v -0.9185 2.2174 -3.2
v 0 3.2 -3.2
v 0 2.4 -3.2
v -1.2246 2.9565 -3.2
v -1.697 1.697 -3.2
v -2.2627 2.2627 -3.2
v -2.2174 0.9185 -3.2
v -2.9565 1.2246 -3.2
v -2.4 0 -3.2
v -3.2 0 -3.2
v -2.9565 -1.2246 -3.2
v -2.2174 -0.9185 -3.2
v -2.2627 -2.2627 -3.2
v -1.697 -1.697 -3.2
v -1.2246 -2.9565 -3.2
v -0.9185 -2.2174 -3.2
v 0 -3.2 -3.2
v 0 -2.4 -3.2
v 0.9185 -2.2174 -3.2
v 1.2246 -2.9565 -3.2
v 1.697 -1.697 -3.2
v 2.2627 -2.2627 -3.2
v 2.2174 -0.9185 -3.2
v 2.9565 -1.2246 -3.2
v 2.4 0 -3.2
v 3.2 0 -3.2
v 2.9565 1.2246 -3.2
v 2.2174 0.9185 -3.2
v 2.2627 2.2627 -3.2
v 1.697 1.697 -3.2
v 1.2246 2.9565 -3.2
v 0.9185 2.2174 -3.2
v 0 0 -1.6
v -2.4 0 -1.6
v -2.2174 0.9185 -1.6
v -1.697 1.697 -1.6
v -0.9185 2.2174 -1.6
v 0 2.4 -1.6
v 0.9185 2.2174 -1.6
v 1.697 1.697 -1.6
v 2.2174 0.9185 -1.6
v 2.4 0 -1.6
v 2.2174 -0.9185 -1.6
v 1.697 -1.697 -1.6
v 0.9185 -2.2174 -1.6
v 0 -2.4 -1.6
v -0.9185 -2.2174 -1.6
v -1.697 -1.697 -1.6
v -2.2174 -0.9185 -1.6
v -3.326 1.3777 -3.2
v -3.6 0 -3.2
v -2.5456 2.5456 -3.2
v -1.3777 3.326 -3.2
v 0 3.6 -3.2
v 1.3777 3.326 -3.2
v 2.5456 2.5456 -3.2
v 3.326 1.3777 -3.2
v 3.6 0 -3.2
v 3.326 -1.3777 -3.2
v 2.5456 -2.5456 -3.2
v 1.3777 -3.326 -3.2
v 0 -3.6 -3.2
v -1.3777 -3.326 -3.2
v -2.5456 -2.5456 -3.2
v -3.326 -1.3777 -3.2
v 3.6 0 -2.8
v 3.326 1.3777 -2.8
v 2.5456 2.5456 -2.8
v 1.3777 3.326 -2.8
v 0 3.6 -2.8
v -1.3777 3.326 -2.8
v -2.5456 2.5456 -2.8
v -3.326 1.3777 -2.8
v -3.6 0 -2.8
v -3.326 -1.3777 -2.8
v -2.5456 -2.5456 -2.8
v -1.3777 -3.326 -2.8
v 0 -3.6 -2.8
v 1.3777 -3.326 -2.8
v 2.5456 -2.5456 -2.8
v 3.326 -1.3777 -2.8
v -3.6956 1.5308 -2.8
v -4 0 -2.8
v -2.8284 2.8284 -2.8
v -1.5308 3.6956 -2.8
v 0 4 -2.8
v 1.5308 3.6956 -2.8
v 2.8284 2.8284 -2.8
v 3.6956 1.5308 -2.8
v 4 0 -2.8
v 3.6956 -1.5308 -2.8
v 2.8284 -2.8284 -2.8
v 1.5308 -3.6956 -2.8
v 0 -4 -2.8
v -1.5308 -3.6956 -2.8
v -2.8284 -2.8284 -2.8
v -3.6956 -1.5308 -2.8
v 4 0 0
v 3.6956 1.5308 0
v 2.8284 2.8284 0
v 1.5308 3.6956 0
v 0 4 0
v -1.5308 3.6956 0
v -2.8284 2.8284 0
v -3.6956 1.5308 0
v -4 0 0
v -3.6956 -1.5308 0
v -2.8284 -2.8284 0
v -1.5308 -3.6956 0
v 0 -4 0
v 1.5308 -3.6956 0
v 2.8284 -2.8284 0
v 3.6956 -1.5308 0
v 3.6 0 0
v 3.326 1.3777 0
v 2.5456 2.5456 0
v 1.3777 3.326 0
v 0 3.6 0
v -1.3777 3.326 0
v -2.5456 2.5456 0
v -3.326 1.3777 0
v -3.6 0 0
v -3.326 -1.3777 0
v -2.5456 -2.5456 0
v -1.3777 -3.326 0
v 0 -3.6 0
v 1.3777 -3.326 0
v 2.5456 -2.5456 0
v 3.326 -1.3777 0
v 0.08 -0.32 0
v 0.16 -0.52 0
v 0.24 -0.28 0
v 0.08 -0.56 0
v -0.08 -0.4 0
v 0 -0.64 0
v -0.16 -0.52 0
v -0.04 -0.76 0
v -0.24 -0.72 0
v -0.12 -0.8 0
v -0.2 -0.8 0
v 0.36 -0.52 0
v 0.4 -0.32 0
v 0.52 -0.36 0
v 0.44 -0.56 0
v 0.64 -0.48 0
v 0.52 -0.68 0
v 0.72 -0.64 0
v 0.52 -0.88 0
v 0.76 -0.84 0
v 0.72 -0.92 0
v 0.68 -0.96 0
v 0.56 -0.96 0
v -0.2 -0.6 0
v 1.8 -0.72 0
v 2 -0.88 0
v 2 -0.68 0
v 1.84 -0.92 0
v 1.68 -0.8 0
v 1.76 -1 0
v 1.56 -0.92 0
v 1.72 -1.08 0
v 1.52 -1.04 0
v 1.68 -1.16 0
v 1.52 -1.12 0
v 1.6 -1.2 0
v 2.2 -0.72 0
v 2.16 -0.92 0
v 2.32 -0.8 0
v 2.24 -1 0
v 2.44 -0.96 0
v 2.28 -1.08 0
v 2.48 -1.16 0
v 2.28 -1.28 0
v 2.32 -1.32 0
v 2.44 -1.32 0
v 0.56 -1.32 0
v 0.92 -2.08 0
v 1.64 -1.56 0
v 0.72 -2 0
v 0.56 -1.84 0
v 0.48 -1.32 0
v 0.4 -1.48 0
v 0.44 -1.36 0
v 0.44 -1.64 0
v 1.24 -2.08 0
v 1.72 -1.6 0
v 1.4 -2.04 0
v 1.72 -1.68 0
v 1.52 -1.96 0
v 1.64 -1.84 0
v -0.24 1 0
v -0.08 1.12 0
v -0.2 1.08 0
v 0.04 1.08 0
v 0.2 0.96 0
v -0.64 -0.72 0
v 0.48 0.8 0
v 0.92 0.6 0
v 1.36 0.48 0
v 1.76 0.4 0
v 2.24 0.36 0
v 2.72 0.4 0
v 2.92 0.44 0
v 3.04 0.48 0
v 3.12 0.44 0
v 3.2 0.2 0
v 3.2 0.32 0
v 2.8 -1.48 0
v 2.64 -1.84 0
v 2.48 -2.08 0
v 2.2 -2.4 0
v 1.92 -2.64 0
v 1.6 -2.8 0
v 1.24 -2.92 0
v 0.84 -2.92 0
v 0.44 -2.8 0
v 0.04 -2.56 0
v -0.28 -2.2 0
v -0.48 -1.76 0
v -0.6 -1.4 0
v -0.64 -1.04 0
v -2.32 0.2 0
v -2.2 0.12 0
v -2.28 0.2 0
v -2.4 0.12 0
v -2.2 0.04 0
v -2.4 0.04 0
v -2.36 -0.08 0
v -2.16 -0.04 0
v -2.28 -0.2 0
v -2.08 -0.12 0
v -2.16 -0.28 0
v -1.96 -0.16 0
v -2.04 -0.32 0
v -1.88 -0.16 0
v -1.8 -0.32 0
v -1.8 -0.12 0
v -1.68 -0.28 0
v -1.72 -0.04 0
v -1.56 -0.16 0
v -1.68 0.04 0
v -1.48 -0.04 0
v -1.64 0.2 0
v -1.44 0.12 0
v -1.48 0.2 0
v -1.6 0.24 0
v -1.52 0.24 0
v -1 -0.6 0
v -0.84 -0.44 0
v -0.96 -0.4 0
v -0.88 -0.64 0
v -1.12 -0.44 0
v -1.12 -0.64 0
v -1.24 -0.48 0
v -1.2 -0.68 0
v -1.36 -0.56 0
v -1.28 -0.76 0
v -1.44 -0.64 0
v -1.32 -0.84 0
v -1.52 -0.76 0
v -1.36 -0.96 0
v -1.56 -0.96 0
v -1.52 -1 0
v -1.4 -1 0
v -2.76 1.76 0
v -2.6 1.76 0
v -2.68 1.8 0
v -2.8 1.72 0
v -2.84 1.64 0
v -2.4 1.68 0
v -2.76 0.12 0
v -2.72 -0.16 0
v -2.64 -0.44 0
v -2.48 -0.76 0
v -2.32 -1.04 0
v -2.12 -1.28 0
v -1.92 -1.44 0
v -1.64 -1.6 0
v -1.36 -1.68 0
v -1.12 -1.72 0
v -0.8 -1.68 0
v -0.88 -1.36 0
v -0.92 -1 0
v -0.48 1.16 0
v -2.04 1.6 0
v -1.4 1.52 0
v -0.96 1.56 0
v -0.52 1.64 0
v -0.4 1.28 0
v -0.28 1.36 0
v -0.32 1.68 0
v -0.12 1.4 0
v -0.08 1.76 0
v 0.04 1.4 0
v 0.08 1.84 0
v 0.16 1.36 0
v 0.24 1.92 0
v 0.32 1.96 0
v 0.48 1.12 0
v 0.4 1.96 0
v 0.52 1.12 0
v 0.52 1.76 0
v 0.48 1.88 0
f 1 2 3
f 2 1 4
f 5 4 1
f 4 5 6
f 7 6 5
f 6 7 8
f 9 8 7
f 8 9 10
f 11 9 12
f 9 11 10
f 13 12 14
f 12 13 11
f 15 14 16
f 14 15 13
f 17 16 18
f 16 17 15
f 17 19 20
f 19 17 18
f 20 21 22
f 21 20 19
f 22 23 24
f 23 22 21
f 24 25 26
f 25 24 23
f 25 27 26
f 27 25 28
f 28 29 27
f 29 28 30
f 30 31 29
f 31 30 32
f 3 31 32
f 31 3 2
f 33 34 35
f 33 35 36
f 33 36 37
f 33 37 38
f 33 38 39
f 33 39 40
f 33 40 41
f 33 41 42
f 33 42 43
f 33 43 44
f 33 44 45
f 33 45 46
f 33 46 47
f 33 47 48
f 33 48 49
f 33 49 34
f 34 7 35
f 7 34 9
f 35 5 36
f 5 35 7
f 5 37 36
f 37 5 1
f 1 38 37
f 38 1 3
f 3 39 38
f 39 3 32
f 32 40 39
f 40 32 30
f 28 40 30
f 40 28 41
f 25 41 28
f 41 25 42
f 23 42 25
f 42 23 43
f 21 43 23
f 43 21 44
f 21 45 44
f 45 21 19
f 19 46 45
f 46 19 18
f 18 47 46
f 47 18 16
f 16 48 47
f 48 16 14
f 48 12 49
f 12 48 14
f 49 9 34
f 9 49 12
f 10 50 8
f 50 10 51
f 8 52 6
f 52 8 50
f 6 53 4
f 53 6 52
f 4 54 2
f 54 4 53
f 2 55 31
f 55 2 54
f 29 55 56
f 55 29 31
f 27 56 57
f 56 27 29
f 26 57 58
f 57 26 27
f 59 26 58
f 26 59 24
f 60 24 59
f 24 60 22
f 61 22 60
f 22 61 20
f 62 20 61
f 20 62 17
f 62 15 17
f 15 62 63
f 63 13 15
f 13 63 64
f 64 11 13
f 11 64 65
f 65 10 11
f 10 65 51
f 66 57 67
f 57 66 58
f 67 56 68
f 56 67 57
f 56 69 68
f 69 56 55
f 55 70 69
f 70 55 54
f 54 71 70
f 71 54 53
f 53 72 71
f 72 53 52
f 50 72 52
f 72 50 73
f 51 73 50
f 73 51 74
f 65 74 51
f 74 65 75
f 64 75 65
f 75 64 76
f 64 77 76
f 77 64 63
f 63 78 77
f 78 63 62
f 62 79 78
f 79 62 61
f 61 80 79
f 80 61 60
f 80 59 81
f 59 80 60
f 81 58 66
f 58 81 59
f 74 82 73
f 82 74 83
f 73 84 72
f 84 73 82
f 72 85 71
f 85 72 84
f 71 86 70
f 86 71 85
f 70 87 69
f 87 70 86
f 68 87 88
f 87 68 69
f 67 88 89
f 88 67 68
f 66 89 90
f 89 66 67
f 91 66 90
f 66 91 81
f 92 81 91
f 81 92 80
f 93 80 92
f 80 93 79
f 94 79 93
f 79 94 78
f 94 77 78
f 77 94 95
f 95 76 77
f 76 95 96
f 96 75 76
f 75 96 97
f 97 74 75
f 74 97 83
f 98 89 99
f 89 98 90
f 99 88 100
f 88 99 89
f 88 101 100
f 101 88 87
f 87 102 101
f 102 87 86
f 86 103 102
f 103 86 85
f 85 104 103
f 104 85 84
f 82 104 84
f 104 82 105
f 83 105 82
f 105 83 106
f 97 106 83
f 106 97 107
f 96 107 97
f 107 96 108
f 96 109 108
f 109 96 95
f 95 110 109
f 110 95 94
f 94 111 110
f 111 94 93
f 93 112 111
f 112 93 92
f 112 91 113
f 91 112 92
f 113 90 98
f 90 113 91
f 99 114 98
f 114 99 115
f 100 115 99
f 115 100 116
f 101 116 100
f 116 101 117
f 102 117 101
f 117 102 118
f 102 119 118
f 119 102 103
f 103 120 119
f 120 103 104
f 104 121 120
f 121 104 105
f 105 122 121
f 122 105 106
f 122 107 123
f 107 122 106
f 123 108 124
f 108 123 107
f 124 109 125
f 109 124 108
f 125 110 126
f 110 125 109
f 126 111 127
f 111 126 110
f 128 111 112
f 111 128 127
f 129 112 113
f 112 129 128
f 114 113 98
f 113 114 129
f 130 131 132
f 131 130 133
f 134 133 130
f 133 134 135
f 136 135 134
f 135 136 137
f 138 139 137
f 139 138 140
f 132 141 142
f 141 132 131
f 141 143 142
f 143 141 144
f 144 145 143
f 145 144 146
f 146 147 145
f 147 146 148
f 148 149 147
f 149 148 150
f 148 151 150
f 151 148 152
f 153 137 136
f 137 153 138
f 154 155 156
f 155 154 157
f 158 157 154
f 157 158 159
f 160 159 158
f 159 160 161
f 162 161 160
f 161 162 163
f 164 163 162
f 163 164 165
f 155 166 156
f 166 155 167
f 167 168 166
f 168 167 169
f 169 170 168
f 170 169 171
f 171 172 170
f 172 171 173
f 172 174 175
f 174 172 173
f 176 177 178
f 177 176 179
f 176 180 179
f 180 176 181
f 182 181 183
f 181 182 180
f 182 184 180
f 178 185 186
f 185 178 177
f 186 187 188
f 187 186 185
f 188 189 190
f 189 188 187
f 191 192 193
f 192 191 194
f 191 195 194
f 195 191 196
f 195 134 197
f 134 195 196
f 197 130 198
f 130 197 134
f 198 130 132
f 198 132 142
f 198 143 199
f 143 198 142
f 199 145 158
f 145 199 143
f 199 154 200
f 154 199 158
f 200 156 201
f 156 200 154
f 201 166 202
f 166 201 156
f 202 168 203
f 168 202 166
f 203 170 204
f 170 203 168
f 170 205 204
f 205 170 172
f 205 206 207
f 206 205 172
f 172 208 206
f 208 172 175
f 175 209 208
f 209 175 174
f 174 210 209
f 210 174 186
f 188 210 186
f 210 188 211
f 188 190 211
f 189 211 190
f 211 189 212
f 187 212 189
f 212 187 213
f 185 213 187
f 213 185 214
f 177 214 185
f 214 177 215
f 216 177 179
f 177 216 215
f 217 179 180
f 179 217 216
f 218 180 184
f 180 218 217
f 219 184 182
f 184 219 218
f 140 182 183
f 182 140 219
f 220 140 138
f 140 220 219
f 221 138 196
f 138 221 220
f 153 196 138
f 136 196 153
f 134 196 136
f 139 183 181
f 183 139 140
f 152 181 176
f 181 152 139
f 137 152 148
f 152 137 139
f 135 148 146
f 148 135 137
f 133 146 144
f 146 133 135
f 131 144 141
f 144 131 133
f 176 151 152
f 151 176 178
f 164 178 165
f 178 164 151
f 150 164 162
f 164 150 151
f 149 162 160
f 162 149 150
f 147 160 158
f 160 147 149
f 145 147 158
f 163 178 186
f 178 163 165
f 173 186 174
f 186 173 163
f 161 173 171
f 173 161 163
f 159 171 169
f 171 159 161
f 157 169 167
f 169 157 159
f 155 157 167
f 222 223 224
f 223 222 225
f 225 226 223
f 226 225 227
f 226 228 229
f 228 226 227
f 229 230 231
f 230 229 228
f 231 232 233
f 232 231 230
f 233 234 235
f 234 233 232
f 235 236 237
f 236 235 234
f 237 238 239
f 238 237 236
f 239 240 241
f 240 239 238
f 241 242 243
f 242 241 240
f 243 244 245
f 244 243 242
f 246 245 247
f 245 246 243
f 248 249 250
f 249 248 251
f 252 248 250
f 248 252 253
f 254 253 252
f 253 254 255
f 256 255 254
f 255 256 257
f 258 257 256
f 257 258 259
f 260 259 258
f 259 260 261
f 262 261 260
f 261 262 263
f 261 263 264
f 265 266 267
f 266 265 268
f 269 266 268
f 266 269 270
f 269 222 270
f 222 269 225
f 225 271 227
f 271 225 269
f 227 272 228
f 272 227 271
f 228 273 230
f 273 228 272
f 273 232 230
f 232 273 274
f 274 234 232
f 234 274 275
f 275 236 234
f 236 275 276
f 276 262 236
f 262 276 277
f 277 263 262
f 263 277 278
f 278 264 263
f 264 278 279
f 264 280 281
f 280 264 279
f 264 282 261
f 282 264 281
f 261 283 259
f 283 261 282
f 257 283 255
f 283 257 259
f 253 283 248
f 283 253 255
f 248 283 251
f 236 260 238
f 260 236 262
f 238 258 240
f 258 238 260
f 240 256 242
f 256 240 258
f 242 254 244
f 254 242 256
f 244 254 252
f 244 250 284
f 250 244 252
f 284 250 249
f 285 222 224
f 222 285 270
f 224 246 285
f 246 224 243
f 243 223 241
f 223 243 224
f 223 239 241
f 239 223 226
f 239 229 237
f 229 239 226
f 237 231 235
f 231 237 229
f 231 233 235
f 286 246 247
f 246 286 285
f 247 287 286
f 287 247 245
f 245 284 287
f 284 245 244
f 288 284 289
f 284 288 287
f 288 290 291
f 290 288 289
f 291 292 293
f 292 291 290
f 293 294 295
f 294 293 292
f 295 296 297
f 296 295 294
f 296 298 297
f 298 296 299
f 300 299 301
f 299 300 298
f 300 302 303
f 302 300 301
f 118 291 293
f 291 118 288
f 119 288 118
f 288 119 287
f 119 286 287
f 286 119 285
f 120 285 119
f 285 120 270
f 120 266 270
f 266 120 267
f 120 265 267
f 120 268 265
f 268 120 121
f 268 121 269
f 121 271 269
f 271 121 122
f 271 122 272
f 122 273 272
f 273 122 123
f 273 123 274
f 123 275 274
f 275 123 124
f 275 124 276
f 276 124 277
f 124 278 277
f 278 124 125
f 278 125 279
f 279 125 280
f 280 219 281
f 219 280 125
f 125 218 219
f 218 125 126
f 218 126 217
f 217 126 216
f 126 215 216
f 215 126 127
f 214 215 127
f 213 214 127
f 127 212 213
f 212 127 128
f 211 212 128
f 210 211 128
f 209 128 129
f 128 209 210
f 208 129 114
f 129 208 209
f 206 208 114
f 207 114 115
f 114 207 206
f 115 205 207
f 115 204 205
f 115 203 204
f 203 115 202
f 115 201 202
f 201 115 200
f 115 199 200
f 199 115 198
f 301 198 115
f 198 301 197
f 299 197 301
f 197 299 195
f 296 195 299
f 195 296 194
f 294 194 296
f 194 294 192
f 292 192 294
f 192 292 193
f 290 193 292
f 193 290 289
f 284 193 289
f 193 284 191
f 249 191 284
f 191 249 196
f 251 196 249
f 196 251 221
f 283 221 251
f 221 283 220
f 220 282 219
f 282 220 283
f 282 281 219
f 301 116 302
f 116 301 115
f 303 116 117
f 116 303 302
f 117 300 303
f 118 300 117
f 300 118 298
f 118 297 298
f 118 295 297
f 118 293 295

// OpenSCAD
use <../lib.scad>
use <../p/4-4ering.scad>
use <s/98138s01.scad>
$fa=1; $fs=0.2;
function ldraw_lib__98138p24(realsolid=false) = [
// 0 Tile  1 x  1 Round with Theatre Masks Pattern
// 0 Name: 98138p24.dat
// 0 Author: Takeshi Takahashi [RainbowDolphin]
// 0 !LDRAW_ORG Part UPDATE 2022-01
// 0 !LICENSE Licensed under CC BY 2.0 and CC BY 4.0 : see CAreadme.txt
// 
// 0 BFC CERTIFY CCW
  [0,"BFC","CERTIFY"],
  [0,"BFC","CCW"],
// 
// 0 !KEYWORDS Bricklink 98138pb163, Dots, Mega Pack, Set 41913
// 
// 0 !HISTORY 2022-01-14 [PTadmin] Official Update 2022-01
// 
// 
// 1 16 0 0 0 1 0 0 0 1 0 0 0 1 s\98138s01.dat
  [1,16,0,0,0,1,0,0,0,1,0,0,0,1, ldraw_lib__s__98138s01(realsolid)],
// 1 0 0 0 0 9 0 0 0 1 0 0 0 9 4-4ering.dat
  [1,0,0,0,0,9,0,0,0,1,0,0,0,9, ldraw_lib__4_4ering(realsolid)],
// 4 0 0.4 0 -1.3 0.6 0 -0.7 0.2 0 -0.8 0.2 0 -1.4
  [4,0,0.4,0,-1.3,0.6,0,-0.7,0.2,0,-0.8,0.2,0,-1.4],
// 4 0 0.2 0 -1.4 0.2 0 -0.8 -0.2 0 -1 0 0 -1.6
  [4,0,0.2,0,-1.4,0.2,0,-0.8,-0.2,0,-1,0,0,-1.6],
// 4 0 0 0 -1.6 -0.2 0 -1 -0.4 0 -1.3 -0.1 0 -1.9
  [4,0,0,0,-1.6,-0.2,0,-1,-0.4,0,-1.3,-0.1,0,-1.9],
// 4 0 -0.1 0 -1.9 -0.6 0 -1.8 -0.5 0 -2 -0.3 0 -2
  [4,0,-0.1,0,-1.9,-0.6,0,-1.8,-0.5,0,-2,-0.3,0,-2],
// 4 0 0.6 0 -0.7 0.4 0 -1.3 0.9 0 -1.3 1 0 -0.8
  [4,0,0.6,0,-0.7,0.4,0,-1.3,0.9,0,-1.3,1,0,-0.8],
// 4 0 1 0 -0.8 0.9 0 -1.3 1.1 0 -1.4 1.3 0 -0.9
  [4,0,1,0,-0.8,0.9,0,-1.3,1.1,0,-1.4,1.3,0,-0.9],
// 4 0 1.3 0 -0.9 1.1 0 -1.4 1.3 0 -1.7 1.6 0 -1.2
  [4,0,1.3,0,-0.9,1.1,0,-1.4,1.3,0,-1.7,1.6,0,-1.2],
// 4 0 1.6 0 -1.2 1.3 0 -1.7 1.3 0 -2.2 1.8 0 -1.6
  [4,0,1.6,0,-1.2,1.3,0,-1.7,1.3,0,-2.2,1.8,0,-1.6],
// 4 0 1.9 0 -2.1 1.8 0 -1.6 1.3 0 -2.2 1.8 0 -2.3
  [4,0,1.9,0,-2.1,1.8,0,-1.6,1.3,0,-2.2,1.8,0,-2.3],
// 4 0 1.8 0 -2.3 1.3 0 -2.2 1.4 0 -2.4 1.7 0 -2.4
  [4,0,1.8,0,-2.3,1.3,0,-2.2,1.4,0,-2.4,1.7,0,-2.4],
// 4 0 -0.1 0 -1.9 -0.4 0 -1.3 -0.5 0 -1.5 -0.6 0 -1.8
  [4,0,-0.1,0,-1.9,-0.4,0,-1.3,-0.5,0,-1.5,-0.6,0,-1.8],
// 4 0 5 0 -2.2 5 0 -1.7 4.5 0 -1.8 4.6 0 -2.3
  [4,0,5,0,-2.2,5,0,-1.7,4.5,0,-1.8,4.6,0,-2.3],
// 4 0 4.6 0 -2.3 4.5 0 -1.8 4.2 0 -2 4.4 0 -2.5
  [4,0,4.6,0,-2.3,4.5,0,-1.8,4.2,0,-2,4.4,0,-2.5],
// 4 0 4.4 0 -2.5 4.2 0 -2 3.9 0 -2.3 4.3 0 -2.7
  [4,0,4.4,0,-2.5,4.2,0,-2,3.9,0,-2.3,4.3,0,-2.7],
// 4 0 4.3 0 -2.7 3.9 0 -2.3 3.8 0 -2.6 4.2 0 -2.9
  [4,0,4.3,0,-2.7,3.9,0,-2.3,3.8,0,-2.6,4.2,0,-2.9],
// 4 0 4.2 0 -2.9 3.8 0 -2.6 3.8 0 -2.8 4 0 -3
  [4,0,4.2,0,-2.9,3.8,0,-2.6,3.8,0,-2.8,4,0,-3],
// 4 0 5 0 -1.7 5 0 -2.2 5.4 0 -2.3 5.5 0 -1.8
  [4,0,5,0,-1.7,5,0,-2.2,5.4,0,-2.3,5.5,0,-1.8],
// 4 0 5.5 0 -1.8 5.4 0 -2.3 5.6 0 -2.5 5.8 0 -2
  [4,0,5.5,0,-1.8,5.4,0,-2.3,5.6,0,-2.5,5.8,0,-2],
// 4 0 5.8 0 -2 5.6 0 -2.5 5.7 0 -2.7 6.1 0 -2.4
  [4,0,5.8,0,-2,5.6,0,-2.5,5.7,0,-2.7,6.1,0,-2.4],
// 4 0 6.1 0 -2.4 5.7 0 -2.7 5.7 0 -3.2 6.2 0 -2.9
  [4,0,6.1,0,-2.4,5.7,0,-2.7,5.7,0,-3.2,6.2,0,-2.9],
// 4 0 6.1 0 -3.3 6.2 0 -2.9 5.7 0 -3.2 5.8 0 -3.3
  [4,0,6.1,0,-3.3,6.2,0,-2.9,5.7,0,-3.2,5.8,0,-3.3],
// 4 0 2.3 0 -5.2 4.1 0 -3.9 1.4 0 -3.3 1.8 0 -5
  [4,0,2.3,0,-5.2,4.1,0,-3.9,1.4,0,-3.3,1.8,0,-5],
// 4 0 1.8 0 -5 1.4 0 -3.3 1.2 0 -3.3 1.4 0 -4.6
  [4,0,1.8,0,-5,1.4,0,-3.3,1.2,0,-3.3,1.4,0,-4.6],
// 4 0 1.4 0 -4.6 1.2 0 -3.3 1.1 0 -3.4 1 0 -3.7
  [4,0,1.4,0,-4.6,1.2,0,-3.3,1.1,0,-3.4,1,0,-3.7],
// 3 0 1 0 -3.7 1.1 0 -4.1 1.4 0 -4.6
  [3,0,1,0,-3.7,1.1,0,-4.1,1.4,0,-4.6],
// 4 0 4.1 0 -3.9 2.3 0 -5.2 3.1 0 -5.2 4.3 0 -4
  [4,0,4.1,0,-3.9,2.3,0,-5.2,3.1,0,-5.2,4.3,0,-4],
// 4 0 4.3 0 -4 3.1 0 -5.2 3.5 0 -5.1 4.3 0 -4.2
  [4,0,4.3,0,-4,3.1,0,-5.2,3.5,0,-5.1,4.3,0,-4.2],
// 4 0 4.3 0 -4.2 3.5 0 -5.1 3.8 0 -4.9 4.1 0 -4.6
  [4,0,4.3,0,-4.2,3.5,0,-5.1,3.8,0,-4.9,4.1,0,-4.6],
// 4 29 0.1 0 2.7 -0.2 0 2.8 -0.5 0 2.7 -0.6 0 2.5
  [4,29,0.1,0,2.7,-0.2,0,2.8,-0.5,0,2.7,-0.6,0,2.5],
// 4 29 0.5 0 2.4 0.1 0 2.7 -0.6 0 2.5 -1.6 0 -1.8
  [4,29,0.5,0,2.4,0.1,0,2.7,-0.6,0,2.5,-1.6,0,-1.8],
// 4 29 0.5 0 2.4 -1.6 0 -1.8 -0.2 0 -1 1.2 0 2
  [4,29,0.5,0,2.4,-1.6,0,-1.8,-0.2,0,-1,1.2,0,2],
// 4 29 1.2 0 2 -0.2 0 -1 0.2 0 -0.8 2.3 0 1.5
  [4,29,1.2,0,2,-0.2,0,-1,0.2,0,-0.8,2.3,0,1.5],
// 3 29 2.3 0 1.5 0.2 0 -0.8 0.6 0 -0.7
  [3,29,2.3,0,1.5,0.2,0,-0.8,0.6,0,-0.7],
// 3 29 2.3 0 1.5 0.6 0 -0.7 1 0 -0.8
  [3,29,2.3,0,1.5,0.6,0,-0.7,1,0,-0.8],
// 4 29 2.3 0 1.5 1 0 -0.8 1.3 0 -0.9 3.4 0 1.2
  [4,29,2.3,0,1.5,1,0,-0.8,1.3,0,-0.9,3.4,0,1.2],
// 4 29 3.4 0 1.2 1.3 0 -0.9 1.6 0 -1.2 4.2 0 -2
  [4,29,3.4,0,1.2,1.3,0,-0.9,1.6,0,-1.2,4.2,0,-2],
// 4 29 4.4 0 1 3.4 0 1.2 4.2 0 -2 4.5 0 -1.8
  [4,29,4.4,0,1,3.4,0,1.2,4.2,0,-2,4.5,0,-1.8],
// 4 29 5.6 0 0.9 4.4 0 1 4.5 0 -1.8 5 0 -1.7
  [4,29,5.6,0,0.9,4.4,0,1,4.5,0,-1.8,5,0,-1.7],
// 4 29 6.8 0 1 5.6 0 0.9 5 0 -1.7 5.5 0 -1.8
  [4,29,6.8,0,1,5.6,0,0.9,5,0,-1.7,5.5,0,-1.8],
// 4 29 6.8 0 1 5.5 0 -1.8 5.8 0 -2 7.3 0 1.1
  [4,29,6.8,0,1,5.5,0,-1.8,5.8,0,-2,7.3,0,1.1],
// 4 29 7.3 0 1.1 5.8 0 -2 6.1 0 -2.4 7.6 0 1.2
  [4,29,7.3,0,1.1,5.8,0,-2,6.1,0,-2.4,7.6,0,1.2],
// 4 29 7.8 0 1.1 7.6 0 1.2 6.1 0 -2.4 6.2 0 -2.9
  [4,29,7.8,0,1.1,7.6,0,1.2,6.1,0,-2.4,6.2,0,-2.9],
// 4 29 8 0 0.8 7.8 0 1.1 6.2 0 -2.9 8 0 0.5
  [4,29,8,0,0.8,7.8,0,1.1,6.2,0,-2.9,8,0,0.5],
// 4 29 7 0 -3.7 8 0 0.5 6.2 0 -2.9 6.1 0 -3.3
  [4,29,7,0,-3.7,8,0,0.5,6.2,0,-2.9,6.1,0,-3.3],
// 4 29 6.6 0 -4.6 7 0 -3.7 6.1 0 -3.3 5.8 0 -3.3
  [4,29,6.6,0,-4.6,7,0,-3.7,6.1,0,-3.3,5.8,0,-3.3],
// 4 29 6.2 0 -5.2 6.6 0 -4.6 5.8 0 -3.3 4.3 0 -4
  [4,29,6.2,0,-5.2,6.6,0,-4.6,5.8,0,-3.3,4.3,0,-4],
// 4 29 6.2 0 -5.2 4.3 0 -4 4.3 0 -4.2 5.5 0 -6
  [4,29,6.2,0,-5.2,4.3,0,-4,4.3,0,-4.2,5.5,0,-6],
// 3 29 4.3 0 -4.2 4.1 0 -4.6 5.5 0 -6
  [3,29,4.3,0,-4.2,4.1,0,-4.6,5.5,0,-6],
// 4 29 5.5 0 -6 4.1 0 -4.6 3.8 0 -4.9 4.8 0 -6.6
  [4,29,5.5,0,-6,4.1,0,-4.6,3.8,0,-4.9,4.8,0,-6.6],
// 4 29 4.8 0 -6.6 3.8 0 -4.9 3.5 0 -5.1 4 0 -7
  [4,29,4.8,0,-6.6,3.8,0,-4.9,3.5,0,-5.1,4,0,-7],
// 4 29 4 0 -7 3.5 0 -5.1 3.1 0 -5.2 3.1 0 -7.3
  [4,29,4,0,-7,3.5,0,-5.1,3.1,0,-5.2,3.1,0,-7.3],
// 4 29 3.1 0 -7.3 3.1 0 -5.2 2.3 0 -5.2 2.1 0 -7.3
  [4,29,3.1,0,-7.3,3.1,0,-5.2,2.3,0,-5.2,2.1,0,-7.3],
// 4 29 2.1 0 -7.3 2.3 0 -5.2 1.8 0 -5 1.1 0 -7
  [4,29,2.1,0,-7.3,2.3,0,-5.2,1.8,0,-5,1.1,0,-7],
// 4 29 1.1 0 -7 1.8 0 -5 1.4 0 -4.6 0.1 0 -6.4
  [4,29,1.1,0,-7,1.8,0,-5,1.4,0,-4.6,0.1,0,-6.4],
// 4 29 0.1 0 -6.4 1.4 0 -4.6 1.1 0 -4.1 -0.7 0 -5.5
  [4,29,0.1,0,-6.4,1.4,0,-4.6,1.1,0,-4.1,-0.7,0,-5.5],
// 4 29 -0.7 0 -5.5 1.1 0 -4.1 1 0 -3.7 -1.2 0 -4.4
  [4,29,-0.7,0,-5.5,1.1,0,-4.1,1,0,-3.7,-1.2,0,-4.4],
// 4 29 -1.2 0 -4.4 1 0 -3.7 1.1 0 -3.4 -0.5 0 -2
  [4,29,-1.2,0,-4.4,1,0,-3.7,1.1,0,-3.4,-0.5,0,-2],
// 4 29 -1.5 0 -3.5 -1.2 0 -4.4 -0.5 0 -2 -0.6 0 -1.8
  [4,29,-1.5,0,-3.5,-1.2,0,-4.4,-0.5,0,-2,-0.6,0,-1.8],
// 4 29 -1.6 0 -2.6 -1.5 0 -3.5 -0.6 0 -1.8 -1.6 0 -1.8
  [4,29,-1.6,0,-2.6,-1.5,0,-3.5,-0.6,0,-1.8,-1.6,0,-1.8],
// 3 29 -0.5 0 -1.5 -1.6 0 -1.8 -0.6 0 -1.8
  [3,29,-0.5,0,-1.5,-1.6,0,-1.8,-0.6,0,-1.8],
// 3 29 -0.4 0 -1.3 -1.6 0 -1.8 -0.5 0 -1.5
  [3,29,-0.4,0,-1.3,-1.6,0,-1.8,-0.5,0,-1.5],
// 3 29 -0.2 0 -1 -1.6 0 -1.8 -0.4 0 -1.3
  [3,29,-0.2,0,-1,-1.6,0,-1.8,-0.4,0,-1.3],
// 4 29 -0.5 0 -2 1.1 0 -3.4 1.2 0 -3.3 -0.3 0 -2
  [4,29,-0.5,0,-2,1.1,0,-3.4,1.2,0,-3.3,-0.3,0,-2],
// 4 29 -0.3 0 -2 1.2 0 -3.3 1.4 0 -3.3 1.4 0 -2.4
  [4,29,-0.3,0,-2,1.2,0,-3.3,1.4,0,-3.3,1.4,0,-2.4],
// 4 29 -0.1 0 -1.9 -0.3 0 -2 1.4 0 -2.4 1.3 0 -2.2
  [4,29,-0.1,0,-1.9,-0.3,0,-2,1.4,0,-2.4,1.3,0,-2.2],
// 4 29 0 0 -1.6 -0.1 0 -1.9 1.3 0 -2.2 1.3 0 -1.7
  [4,29,0,0,-1.6,-0.1,0,-1.9,1.3,0,-2.2,1.3,0,-1.7],
// 4 29 0.2 0 -1.4 0 0 -1.6 1.3 0 -1.7 1.1 0 -1.4
  [4,29,0.2,0,-1.4,0,0,-1.6,1.3,0,-1.7,1.1,0,-1.4],
// 4 29 0.4 0 -1.3 0.2 0 -1.4 1.1 0 -1.4 0.9 0 -1.3
  [4,29,0.4,0,-1.3,0.2,0,-1.4,1.1,0,-1.4,0.9,0,-1.3],
// 4 29 1.7 0 -2.4 1.4 0 -2.4 1.4 0 -3.3 4.1 0 -3.9
  [4,29,1.7,0,-2.4,1.4,0,-2.4,1.4,0,-3.3,4.1,0,-3.9],
// 4 29 1.7 0 -2.4 4.1 0 -3.9 4 0 -3 3.8 0 -2.8
  [4,29,1.7,0,-2.4,4.1,0,-3.9,4,0,-3,3.8,0,-2.8],
// 4 29 1.8 0 -2.3 1.7 0 -2.4 3.8 0 -2.8 3.8 0 -2.6
  [4,29,1.8,0,-2.3,1.7,0,-2.4,3.8,0,-2.8,3.8,0,-2.6],
// 4 29 1.9 0 -2.1 1.8 0 -2.3 3.8 0 -2.6 3.9 0 -2.3
  [4,29,1.9,0,-2.1,1.8,0,-2.3,3.8,0,-2.6,3.9,0,-2.3],
// 4 29 1.8 0 -1.6 1.9 0 -2.1 3.9 0 -2.3 4.2 0 -2
  [4,29,1.8,0,-1.6,1.9,0,-2.1,3.9,0,-2.3,4.2,0,-2],
// 3 29 1.6 0 -1.2 1.8 0 -1.6 4.2 0 -2
  [3,29,1.6,0,-1.2,1.8,0,-1.6,4.2,0,-2],
// 4 29 4.2 0 -2.9 4 0 -3 4.1 0 -3.9 4.3 0 -4
  [4,29,4.2,0,-2.9,4,0,-3,4.1,0,-3.9,4.3,0,-4],
// 4 29 5.7 0 -3.2 4.2 0 -2.9 4.3 0 -4 5.8 0 -3.3
  [4,29,5.7,0,-3.2,4.2,0,-2.9,4.3,0,-4,5.8,0,-3.3],
// 4 29 4.3 0 -2.7 4.2 0 -2.9 5.7 0 -3.2 5.7 0 -2.7
  [4,29,4.3,0,-2.7,4.2,0,-2.9,5.7,0,-3.2,5.7,0,-2.7],
// 4 29 4.4 0 -2.5 4.3 0 -2.7 5.7 0 -2.7 5.6 0 -2.5
  [4,29,4.4,0,-2.5,4.3,0,-2.7,5.7,0,-2.7,5.6,0,-2.5],
// 4 29 4.6 0 -2.3 4.4 0 -2.5 5.6 0 -2.5 5.4 0 -2.3
  [4,29,4.6,0,-2.3,4.4,0,-2.5,5.6,0,-2.5,5.4,0,-2.3],
// 3 29 5 0 -2.2 4.6 0 -2.3 5.4 0 -2.3
  [3,29,5,0,-2.2,4.6,0,-2.3,5.4,0,-2.3],
// 4 0 -5.7 0 0.5 -5.8 0 0.5 -6 0 0.3 -5.5 0 0.3
  [4,0,-5.7,0,0.5,-5.8,0,0.5,-6,0,0.3,-5.5,0,0.3],
// 4 0 -5.5 0 0.3 -6 0 0.3 -6 0 0.1 -5.5 0 0.1
  [4,0,-5.5,0,0.3,-6,0,0.3,-6,0,0.1,-5.5,0,0.1],
// 4 0 -5.5 0 0.1 -6 0 0.1 -5.9 0 -0.2 -5.4 0 -0.1
  [4,0,-5.5,0,0.1,-6,0,0.1,-5.9,0,-0.2,-5.4,0,-0.1],
// 4 0 -5.4 0 -0.1 -5.9 0 -0.2 -5.7 0 -0.5 -5.2 0 -0.3
  [4,0,-5.4,0,-0.1,-5.9,0,-0.2,-5.7,0,-0.5,-5.2,0,-0.3],
// 4 0 -5.2 0 -0.3 -5.7 0 -0.5 -5.4 0 -0.7 -4.9 0 -0.4
  [4,0,-5.2,0,-0.3,-5.7,0,-0.5,-5.4,0,-0.7,-4.9,0,-0.4],
// 4 0 -4.9 0 -0.4 -5.4 0 -0.7 -5.1 0 -0.8 -4.7 0 -0.4
  [4,0,-4.9,0,-0.4,-5.4,0,-0.7,-5.1,0,-0.8,-4.7,0,-0.4],
// 4 0 -4.7 0 -0.4 -5.1 0 -0.8 -4.5 0 -0.8 -4.5 0 -0.3
  [4,0,-4.7,0,-0.4,-5.1,0,-0.8,-4.5,0,-0.8,-4.5,0,-0.3],
// 4 0 -4.5 0 -0.3 -4.5 0 -0.8 -4.2 0 -0.7 -4.3 0 -0.1
  [4,0,-4.5,0,-0.3,-4.5,0,-0.8,-4.2,0,-0.7,-4.3,0,-0.1],
// 4 0 -4.3 0 -0.1 -4.2 0 -0.7 -3.9 0 -0.4 -4.2 0 0.1
  [4,0,-4.3,0,-0.1,-4.2,0,-0.7,-3.9,0,-0.4,-4.2,0,0.1],
// 4 0 -4.2 0 0.1 -3.9 0 -0.4 -3.7 0 -0.1 -4.1 0 0.5
  [4,0,-4.2,0,0.1,-3.9,0,-0.4,-3.7,0,-0.1,-4.1,0,0.5],
// 4 0 -4.1 0 0.5 -3.7 0 -0.1 -3.6 0 0.3 -3.7 0 0.5
  [4,0,-4.1,0,0.5,-3.7,0,-0.1,-3.6,0,0.3,-3.7,0,0.5],
// 4 0 -4 0 0.6 -4.1 0 0.5 -3.7 0 0.5 -3.8 0 0.6
  [4,0,-4,0,0.6,-4.1,0,0.5,-3.7,0,0.5,-3.8,0,0.6],
// 4 0 -2.2 0 -1.6 -2.1 0 -1.1 -2.4 0 -1 -2.5 0 -1.5
  [4,0,-2.2,0,-1.6,-2.1,0,-1.1,-2.4,0,-1,-2.5,0,-1.5],
// 4 0 -2.5 0 -1.5 -2.4 0 -1 -2.8 0 -1.1 -2.8 0 -1.6
  [4,0,-2.5,0,-1.5,-2.4,0,-1,-2.8,0,-1.1,-2.8,0,-1.6],
// 4 0 -2.8 0 -1.6 -2.8 0 -1.1 -3.1 0 -1.2 -3 0 -1.7
  [4,0,-2.8,0,-1.6,-2.8,0,-1.1,-3.1,0,-1.2,-3,0,-1.7],
// 4 0 -3 0 -1.7 -3.1 0 -1.2 -3.4 0 -1.4 -3.2 0 -1.9
  [4,0,-3,0,-1.7,-3.1,0,-1.2,-3.4,0,-1.4,-3.2,0,-1.9],
// 4 0 -3.2 0 -1.9 -3.4 0 -1.4 -3.6 0 -1.6 -3.3 0 -2.1
  [4,0,-3.2,0,-1.9,-3.4,0,-1.4,-3.6,0,-1.6,-3.3,0,-2.1],
// 4 0 -3.3 0 -2.1 -3.6 0 -1.6 -3.8 0 -1.9 -3.4 0 -2.4
  [4,0,-3.3,0,-2.1,-3.6,0,-1.6,-3.8,0,-1.9,-3.4,0,-2.4],
// 4 0 -3.4 0 -2.4 -3.8 0 -1.9 -3.9 0 -2.4 -3.8 0 -2.5
  [4,0,-3.4,0,-2.4,-3.8,0,-1.9,-3.9,0,-2.4,-3.8,0,-2.5],
// 3 0 -3.4 0 -2.4 -3.8 0 -2.5 -3.5 0 -2.5
  [3,0,-3.4,0,-2.4,-3.8,0,-2.5,-3.5,0,-2.5],
// 4 16 -6.5 0 4.4 -6.7 0 4.5 -6.9 0 4.4 -7 0 4.3
  [4,16,-6.5,0,4.4,-6.7,0,4.5,-6.9,0,4.4,-7,0,4.3],
// 4 16 -6.5 0 4.4 -7 0 4.3 -7.1 0 4.1 -6 0 4.2
  [4,16,-6.5,0,4.4,-7,0,4.3,-7.1,0,4.1,-6,0,4.2],
// 4 16 -5.8 0 .5 -6 0 4.2 -7.1 0 4.1 -6 0 .3
  [4,16,-5.8,0,.5,-6,0,4.2,-7.1,0,4.1,-6,0,.3],
// 4 16 -6 0 .3 -7.1 0 4.1 -6.9 0 .3 -6 0 .1
  [4,16,-6,0,.3,-7.1,0,4.1,-6.9,0,.3,-6,0,.1],
// 4 16 -6 0 .1 -6.9 0 .3 -6.8 0 -.4 -5.9 0 -.2
  [4,16,-6,0,.1,-6.9,0,.3,-6.8,0,-.4,-5.9,0,-.2],
// 4 16 -5.9 0 -.2 -6.8 0 -.4 -6.6 0 -1.1 -5.7 0 -.5
  [4,16,-5.9,0,-.2,-6.8,0,-.4,-6.6,0,-1.1,-5.7,0,-.5],
// 4 16 -5.7 0 -.5 -6.6 0 -1.1 -6.2 0 -1.9 -5.4 0 -.7
  [4,16,-5.7,0,-.5,-6.6,0,-1.1,-6.2,0,-1.9,-5.4,0,-.7],
// 4 16 -5.4 0 -.7 -6.2 0 -1.9 -5.8 0 -2.6 -5.1 0 -.8
  [4,16,-5.4,0,-.7,-6.2,0,-1.9,-5.8,0,-2.6,-5.1,0,-.8],
// 4 16 -5.1 0 -.8 -5.8 0 -2.6 -5.3 0 -3.2 -4.5 0 -.8
  [4,16,-5.1,0,-.8,-5.8,0,-2.6,-5.3,0,-3.2,-4.5,0,-.8],
// 4 16 -3.9 0 -2.4 -4.5 0 -.8 -5.3 0 -3.2 -4.8 0 -3.6
  [4,16,-3.9,0,-2.4,-4.5,0,-.8,-5.3,0,-3.2,-4.8,0,-3.6],
// 4 16 -3.8 0 -2.5 -3.9 0 -2.4 -4.8 0 -3.6 -4.1 0 -4
  [4,16,-3.8,0,-2.5,-3.9,0,-2.4,-4.8,0,-3.6,-4.1,0,-4],
// 4 16 -3.5 0 -2.5 -3.8 0 -2.5 -4.1 0 -4 -3.4 0 -4.2
  [4,16,-3.5,0,-2.5,-3.8,0,-2.5,-4.1,0,-4,-3.4,0,-4.2],
// 4 16 -3.5 0 -2.5 -3.4 0 -4.2 -2.8 0 -4.3 -2 0 -4.2
  [4,16,-3.5,0,-2.5,-3.4,0,-4.2,-2.8,0,-4.3,-2,0,-4.2],
// 4 16 -3.5 0 -2.5 -2 0 -4.2 -2.2 0 -3.4 -3.4 0 -2.4
  [4,16,-3.5,0,-2.5,-2,0,-4.2,-2.2,0,-3.4,-3.4,0,-2.4],
// 4 16 -3.4 0 -2.4 -2.2 0 -3.4 -2.3 0 -2.5 -3.3 0 -2.1
  [4,16,-3.4,0,-2.4,-2.2,0,-3.4,-2.3,0,-2.5,-3.3,0,-2.1],
// 4 16 -3.2 0 -1.9 -3.3 0 -2.1 -2.3 0 -2.5 -3 0 -1.7
  [4,16,-3.2,0,-1.9,-3.3,0,-2.1,-2.3,0,-2.5,-3,0,-1.7],
// 4 16 -2.8 0 -1.6 -3 0 -1.7 -2.3 0 -2.5 -2.5 0 -1.5
  [4,16,-2.8,0,-1.6,-3,0,-1.7,-2.3,0,-2.5,-2.5,0,-1.5],
// 3 16 -2.5 0 -1.5 -2.3 0 -2.5 -2.2 0 -1.6
  [3,16,-2.5,0,-1.5,-2.3,0,-2.5,-2.2,0,-1.6],
// 4 16 -4.5 0 -.8 -3.9 0 -2.4 -3.8 0 -1.9 -4.2 0 -.7
  [4,16,-4.5,0,-.8,-3.9,0,-2.4,-3.8,0,-1.9,-4.2,0,-.7],
// 4 16 -4.2 0 -.7 -3.8 0 -1.9 -3.6 0 -1.6 -3.9 0 -.4
  [4,16,-4.2,0,-.7,-3.8,0,-1.9,-3.6,0,-1.6,-3.9,0,-.4],
// 4 16 -3.9 0 -.4 -3.6 0 -1.6 -3.4 0 -1.4 -3.7 0 -.1
  [4,16,-3.9,0,-.4,-3.6,0,-1.6,-3.4,0,-1.4,-3.7,0,-.1],
// 4 16 -3.7 0 -.1 -3.4 0 -1.4 -3.1 0 -1.2 -3.6 0 .3
  [4,16,-3.7,0,-.1,-3.4,0,-1.4,-3.1,0,-1.2,-3.6,0,.3],
// 3 16 -3.6 0 .3 -3.1 0 -1.2 -2.8 0 -1.1
  [3,16,-3.6,0,.3,-3.1,0,-1.2,-2.8,0,-1.1],
// 4 16 -3.6 0 .3 -2.8 0 -1.1 -2.4 0 -1 -1.2 0 2.9
  [4,16,-3.6,0,.3,-2.8,0,-1.1,-2.4,0,-1,-1.2,0,2.9],
// 3 16 -1.2 0 2.9 -2.4 0 -1 -2.1 0 -1.1
  [3,16,-1.2,0,2.9,-2.4,0,-1,-2.1,0,-1.1],
// 4 16 -6 0 4.2 -5.8 0 .5 -5.7 0 .5 -5.1 0 4
  [4,16,-6,0,4.2,-5.8,0,.5,-5.7,0,.5,-5.1,0,4],
// 4 16 -4 0 .6 -5.1 0 4 -5.7 0 .5 -4.1 0 .5
  [4,16,-4,0,.6,-5.1,0,4,-5.7,0,.5,-4.1,0,.5],
// 4 16 -4.1 0 .5 -5.7 0 .5 -5.5 0 .3 -4.2 0 .1
  [4,16,-4.1,0,.5,-5.7,0,.5,-5.5,0,.3,-4.2,0,.1],
// 4 16 -4.2 0 .1 -5.5 0 .3 -5.5 0 .1 -4.3 0 -.1
  [4,16,-4.2,0,.1,-5.5,0,.3,-5.5,0,.1,-4.3,0,-.1],
// 4 16 -4.3 0 -.1 -5.5 0 .1 -5.4 0 -.1 -4.5 0 -.3
  [4,16,-4.3,0,-.1,-5.5,0,.1,-5.4,0,-.1,-4.5,0,-.3],
// 4 16 -4.5 0 -.3 -5.4 0 -.1 -5.2 0 -.3 -4.7 0 -.4
  [4,16,-4.5,0,-.3,-5.4,0,-.1,-5.2,0,-.3,-4.7,0,-.4],
// 3 16 -5.2 0 -.3 -4.9 0 -.4 -4.7 0 -.4
  [3,16,-5.2,0,-.3,-4.9,0,-.4,-4.7,0,-.4],
// 4 16 -5.1 0 4 -4 0 .6 -3.8 0 .6 -3.5 0 3.8
  [4,16,-5.1,0,4,-4,0,.6,-3.8,0,.6,-3.5,0,3.8],
// 4 16 -3.5 0 3.8 -3.8 0 .6 -3.7 0 .5 -2.4 0 3.9
  [4,16,-3.5,0,3.8,-3.8,0,.6,-3.7,0,.5,-2.4,0,3.9],
// 4 16 -2.4 0 3.9 -3.7 0 .5 -3.6 0 .3 -1.2 0 2.9
  [4,16,-2.4,0,3.9,-3.7,0,.5,-3.6,0,.3,-1.2,0,2.9],
// 4 16 -2.4 0 3.9 -1.2 0 2.9 -1 0 3.2 -1.3 0 4.1
  [4,16,-2.4,0,3.9,-1.2,0,2.9,-1,0,3.2,-1.3,0,4.1],
// 4 16 -1.3 0 4.1 -1 0 3.2 -.7 0 3.4 -.8 0 4.2
  [4,16,-1.3,0,4.1,-1,0,3.2,-.7,0,3.4,-.8,0,4.2],
// 4 16 -.8 0 4.2 -.7 0 3.4 -.3 0 3.5 -.2 0 4.4
  [4,16,-.8,0,4.2,-.7,0,3.4,-.3,0,3.5,-.2,0,4.4],
// 4 16 -.2 0 4.4 -.3 0 3.5 .1 0 3.5 .2 0 4.6
  [4,16,-.2,0,4.4,-.3,0,3.5,.1,0,3.5,.2,0,4.6],
// 4 16 .2 0 4.6 .1 0 3.5 .4 0 3.4 .6 0 4.8
  [4,16,.2,0,4.6,.1,0,3.5,.4,0,3.4,.6,0,4.8],
// 4 16 .6 0 4.8 .4 0 3.4 1.2 0 2.8 .8 0 4.9
  [4,16,.6,0,4.8,.4,0,3.4,1.2,0,2.8,.8,0,4.9],
// 4 16 .8 0 4.9 1.2 0 2.8 1.3 0 2.8 1 0 4.9
  [4,16,.8,0,4.9,1.2,0,2.8,1.3,0,2.8,1,0,4.9],
// 4 16 1.2 0 4.7 1 0 4.9 1.3 0 2.8 1.3 0 4.4
  [4,16,1.2,0,4.7,1,0,4.9,1.3,0,2.8,1.3,0,4.4],
// 4 0 -0.8 0 4.2 -0.2 0 4.4 0 0 9 -1.3 0 4.1
  [4,0,-0.8,0,4.2,-0.2,0,4.4,0,0,9,-1.3,0,4.1],
// 4 0 -1.3 0 4.1 0 0 9 -3.4443 0 8.3151 -2.4 0 3.9
  [4,0,-1.3,0,4.1,0,0,9,-3.4443,0,8.3151,-2.4,0,3.9],
// 4 0 -3.5 0 3.8 -2.4 0 3.9 -3.4443 0 8.3151 -5.1 0 4
  [4,0,-3.5,0,3.8,-2.4,0,3.9,-3.4443,0,8.3151,-5.1,0,4],
// 4 0 -5.1 0 4 -3.4443 0 8.3151 -6.3639 0 6.3639 -6 0 4.2
  [4,0,-5.1,0,4,-3.4443,0,8.3151,-6.3639,0,6.3639,-6,0,4.2],
// 4 0 -6.5 0 4.4 -6 0 4.2 -6.3639 0 6.3639 -6.7 0 4.5
  [4,0,-6.5,0,4.4,-6,0,4.2,-6.3639,0,6.3639,-6.7,0,4.5],
// 3 0 -6.3639 0 6.3639 -6.9 0 4.4 -6.7 0 4.5
  [3,0,-6.3639,0,6.3639,-6.9,0,4.4,-6.7,0,4.5],
// 4 0 -7 0 4.3 -6.9 0 4.4 -6.3639 0 6.3639 -8.3151 0 3.4443
  [4,0,-7,0,4.3,-6.9,0,4.4,-6.3639,0,6.3639,-8.3151,0,3.4443],
// 3 0 -7 0 4.3 -8.3151 0 3.4443 -7.1 0 4.1
  [3,0,-7,0,4.3,-8.3151,0,3.4443,-7.1,0,4.1],
// 4 0 -6.9 0 0.3 -7.1 0 4.1 -8.3151 0 3.4443 -9 0 0
  [4,0,-6.9,0,0.3,-7.1,0,4.1,-8.3151,0,3.4443,-9,0,0],
// 3 0 -6.9 0 0.3 -9 0 0 -6.8 0 -0.4
  [3,0,-6.9,0,0.3,-9,0,0,-6.8,0,-0.4],
// 4 0 -6.6 0 -1.1 -6.8 0 -0.4 -9 0 0 -8.3151 0 -3.4443
  [4,0,-6.6,0,-1.1,-6.8,0,-0.4,-9,0,0,-8.3151,0,-3.4443],
// 3 0 -6.6 0 -1.1 -8.3151 0 -3.4443 -6.2 0 -1.9
  [3,0,-6.6,0,-1.1,-8.3151,0,-3.4443,-6.2,0,-1.9],
// 4 0 -5.8 0 -2.6 -6.2 0 -1.9 -8.3151 0 -3.4443 -6.3639 0 -6.3639
  [4,0,-5.8,0,-2.6,-6.2,0,-1.9,-8.3151,0,-3.4443,-6.3639,0,-6.3639],
// 3 0 -5.8 0 -2.6 -6.3639 0 -6.3639 -5.3 0 -3.2
  [3,0,-5.8,0,-2.6,-6.3639,0,-6.3639,-5.3,0,-3.2],
// 3 0 -5.3 0 -3.2 -6.3639 0 -6.3639 -4.8 0 -3.6
  [3,0,-5.3,0,-3.2,-6.3639,0,-6.3639,-4.8,0,-3.6],
// 4 0 -4.1 0 -4 -4.8 0 -3.6 -6.3639 0 -6.3639 -3.4443 0 -8.3151
  [4,0,-4.1,0,-4,-4.8,0,-3.6,-6.3639,0,-6.3639,-3.4443,0,-8.3151],
// 3 0 -4.1 0 -4 -3.4443 0 -8.3151 -3.4 0 -4.2
  [3,0,-4.1,0,-4,-3.4443,0,-8.3151,-3.4,0,-4.2],
// 3 0 -3.4 0 -4.2 -3.4443 0 -8.3151 -2.8 0 -4.3
  [3,0,-3.4,0,-4.2,-3.4443,0,-8.3151,-2.8,0,-4.3],
// 4 0 -2 0 -4.2 -2.8 0 -4.3 -3.4443 0 -8.3151 -1.2 0 -4.4
  [4,0,-2,0,-4.2,-2.8,0,-4.3,-3.4443,0,-8.3151,-1.2,0,-4.4],
// 4 0 -0.7 0 -5.5 -1.2 0 -4.4 -3.4443 0 -8.3151 0 0 -9
  [4,0,-0.7,0,-5.5,-1.2,0,-4.4,-3.4443,0,-8.3151,0,0,-9],
// 3 0 -0.7 0 -5.5 0 0 -9 0.1 0 -6.4
  [3,0,-0.7,0,-5.5,0,0,-9,0.1,0,-6.4],
// 3 0 0.1 0 -6.4 0 0 -9 1.1 0 -7
  [3,0,0.1,0,-6.4,0,0,-9,1.1,0,-7],
// 4 0 2.1 0 -7.3 1.1 0 -7 0 0 -9 3.4443 0 -8.3151
  [4,0,2.1,0,-7.3,1.1,0,-7,0,0,-9,3.4443,0,-8.3151],
// 3 0 3.1 0 -7.3 2.1 0 -7.3 3.4443 0 -8.3151
  [3,0,3.1,0,-7.3,2.1,0,-7.3,3.4443,0,-8.3151],
// 3 0 4 0 -7 3.1 0 -7.3 3.4443 0 -8.3151
  [3,0,4,0,-7,3.1,0,-7.3,3.4443,0,-8.3151],
// 4 0 4.8 0 -6.6 4 0 -7 3.4443 0 -8.3151 6.3639 0 -6.3639
  [4,0,4.8,0,-6.6,4,0,-7,3.4443,0,-8.3151,6.3639,0,-6.3639],
// 3 0 5.5 0 -6 4.8 0 -6.6 6.3639 0 -6.3639
  [3,0,5.5,0,-6,4.8,0,-6.6,6.3639,0,-6.3639],
// 3 0 6.2 0 -5.2 5.5 0 -6 6.3639 0 -6.3639
  [3,0,6.2,0,-5.2,5.5,0,-6,6.3639,0,-6.3639],
// 4 0 6.6 0 -4.6 6.2 0 -5.2 6.3639 0 -6.3639 8.3151 0 -3.4443
  [4,0,6.6,0,-4.6,6.2,0,-5.2,6.3639,0,-6.3639,8.3151,0,-3.4443],
// 4 0 7 0 -3.7 6.6 0 -4.6 8.3151 0 -3.4443 9 0 0
  [4,0,7,0,-3.7,6.6,0,-4.6,8.3151,0,-3.4443,9,0,0],
// 3 0 8 0 0.5 7 0 -3.7 9 0 0
  [3,0,8,0,0.5,7,0,-3.7,9,0,0],
// 4 0 8 0 0.8 8 0 0.5 9 0 0 8.3151 0 3.4443
  [4,0,8,0,0.8,8,0,0.5,9,0,0,8.3151,0,3.4443],
// 3 0 8.3151 0 3.4443 7.8 0 1.1 8 0 0.8
  [3,0,8.3151,0,3.4443,7.8,0,1.1,8,0,0.8],
// 3 0 8.3151 0 3.4443 7.6 0 1.2 7.8 0 1.1
  [3,0,8.3151,0,3.4443,7.6,0,1.2,7.8,0,1.1],
// 4 0 7.3 0 1.1 7.6 0 1.2 8.3151 0 3.4443 6.8 0 1
  [4,0,7.3,0,1.1,7.6,0,1.2,8.3151,0,3.4443,6.8,0,1],
// 4 0 5.6 0 0.9 6.8 0 1 8.3151 0 3.4443 4.4 0 1
  [4,0,5.6,0,0.9,6.8,0,1,8.3151,0,3.4443,4.4,0,1],
// 4 0 3.4 0 1.2 4.4 0 1 8.3151 0 3.4443 2.3 0 1.5
  [4,0,3.4,0,1.2,4.4,0,1,8.3151,0,3.4443,2.3,0,1.5],
// 4 0 1.2 0 2 2.3 0 1.5 8.3151 0 3.4443 1.3 0 2.8
  [4,0,1.2,0,2,2.3,0,1.5,8.3151,0,3.4443,1.3,0,2.8],
// 4 0 1.2 0 2 1.3 0 2.8 1.2 0 2.8 0.5 0 2.4
  [4,0,1.2,0,2,1.3,0,2.8,1.2,0,2.8,0.5,0,2.4],
// 4 0 0.5 0 2.4 1.2 0 2.8 0.4 0 3.4 0.1 0 2.7
  [4,0,0.5,0,2.4,1.2,0,2.8,0.4,0,3.4,0.1,0,2.7],
// 4 0 0.1 0 2.7 0.4 0 3.4 0.1 0 3.5 -0.2 0 2.8
  [4,0,0.1,0,2.7,0.4,0,3.4,0.1,0,3.5,-0.2,0,2.8],
// 4 0 -0.2 0 2.8 0.1 0 3.5 -0.3 0 3.5 -0.5 0 2.7
  [4,0,-0.2,0,2.8,0.1,0,3.5,-0.3,0,3.5,-0.5,0,2.7],
// 4 0 -0.5 0 2.7 -0.3 0 3.5 -0.7 0 3.4 -1 0 3.2
  [4,0,-0.5,0,2.7,-0.3,0,3.5,-0.7,0,3.4,-1,0,3.2],
// 4 0 -0.6 0 2.5 -0.5 0 2.7 -1 0 3.2 -1.2 0 2.9
  [4,0,-0.6,0,2.5,-0.5,0,2.7,-1,0,3.2,-1.2,0,2.9],
// 4 0 -0.6 0 2.5 -1.2 0 2.9 -2.1 0 -1.1 -1.6 0 -1.8
  [4,0,-0.6,0,2.5,-1.2,0,2.9,-2.1,0,-1.1,-1.6,0,-1.8],
// 4 0 -1.6 0 -1.8 -2.1 0 -1.1 -2.2 0 -1.6 -1.6 0 -2.6
  [4,0,-1.6,0,-1.8,-2.1,0,-1.1,-2.2,0,-1.6,-1.6,0,-2.6],
// 4 0 -1.6 0 -2.6 -2.2 0 -1.6 -2.3 0 -2.5 -1.5 0 -3.5
  [4,0,-1.6,0,-2.6,-2.2,0,-1.6,-2.3,0,-2.5,-1.5,0,-3.5],
// 4 0 -1.5 0 -3.5 -2.3 0 -2.5 -2.2 0 -3.4 -1.2 0 -4.4
  [4,0,-1.5,0,-3.5,-2.3,0,-2.5,-2.2,0,-3.4,-1.2,0,-4.4],
// 3 0 -2.2 0 -3.4 -2 0 -4.2 -1.2 0 -4.4
  [3,0,-2.2,0,-3.4,-2,0,-4.2,-1.2,0,-4.4],
// 4 0 1.3 0 4.4 1.3 0 2.8 8.3151 0 3.4443 6.3639 0 6.3639
  [4,0,1.3,0,4.4,1.3,0,2.8,8.3151,0,3.4443,6.3639,0,6.3639],
// 4 0 1.2 0 4.7 1.3 0 4.4 6.3639 0 6.3639 3.4443 0 8.3151
  [4,0,1.2,0,4.7,1.3,0,4.4,6.3639,0,6.3639,3.4443,0,8.3151],
// 3 0 3.4443 0 8.3151 1 0 4.9 1.2 0 4.7
  [3,0,3.4443,0,8.3151,1,0,4.9,1.2,0,4.7],
// 4 0 0.8 0 4.9 1 0 4.9 3.4443 0 8.3151 0 0 9
  [4,0,0.8,0,4.9,1,0,4.9,3.4443,0,8.3151,0,0,9],
// 3 0 0 0 9 0.6 0 4.8 0.8 0 4.9
  [3,0,0,0,9,0.6,0,4.8,0.8,0,4.9],
// 3 0 0 0 9 0.2 0 4.6 0.6 0 4.8
  [3,0,0,0,9,0.2,0,4.6,0.6,0,4.8],
// 3 0 0 0 9 -0.2 0 4.4 0.2 0 4.6
  [3,0,0,0,9,-0.2,0,4.4,0.2,0,4.6],
];
module ldraw_lib__98138p24(step=0, col=false, unit=2/5, alt=false, line=0.2, solid=!$preview)
    makepoly(ldraw_lib__98138p24(solid), step=step, col=col, unit=unit, alt=alt, line=line, solid=solid);
ldraw_lib__98138p24(line=0.2);
